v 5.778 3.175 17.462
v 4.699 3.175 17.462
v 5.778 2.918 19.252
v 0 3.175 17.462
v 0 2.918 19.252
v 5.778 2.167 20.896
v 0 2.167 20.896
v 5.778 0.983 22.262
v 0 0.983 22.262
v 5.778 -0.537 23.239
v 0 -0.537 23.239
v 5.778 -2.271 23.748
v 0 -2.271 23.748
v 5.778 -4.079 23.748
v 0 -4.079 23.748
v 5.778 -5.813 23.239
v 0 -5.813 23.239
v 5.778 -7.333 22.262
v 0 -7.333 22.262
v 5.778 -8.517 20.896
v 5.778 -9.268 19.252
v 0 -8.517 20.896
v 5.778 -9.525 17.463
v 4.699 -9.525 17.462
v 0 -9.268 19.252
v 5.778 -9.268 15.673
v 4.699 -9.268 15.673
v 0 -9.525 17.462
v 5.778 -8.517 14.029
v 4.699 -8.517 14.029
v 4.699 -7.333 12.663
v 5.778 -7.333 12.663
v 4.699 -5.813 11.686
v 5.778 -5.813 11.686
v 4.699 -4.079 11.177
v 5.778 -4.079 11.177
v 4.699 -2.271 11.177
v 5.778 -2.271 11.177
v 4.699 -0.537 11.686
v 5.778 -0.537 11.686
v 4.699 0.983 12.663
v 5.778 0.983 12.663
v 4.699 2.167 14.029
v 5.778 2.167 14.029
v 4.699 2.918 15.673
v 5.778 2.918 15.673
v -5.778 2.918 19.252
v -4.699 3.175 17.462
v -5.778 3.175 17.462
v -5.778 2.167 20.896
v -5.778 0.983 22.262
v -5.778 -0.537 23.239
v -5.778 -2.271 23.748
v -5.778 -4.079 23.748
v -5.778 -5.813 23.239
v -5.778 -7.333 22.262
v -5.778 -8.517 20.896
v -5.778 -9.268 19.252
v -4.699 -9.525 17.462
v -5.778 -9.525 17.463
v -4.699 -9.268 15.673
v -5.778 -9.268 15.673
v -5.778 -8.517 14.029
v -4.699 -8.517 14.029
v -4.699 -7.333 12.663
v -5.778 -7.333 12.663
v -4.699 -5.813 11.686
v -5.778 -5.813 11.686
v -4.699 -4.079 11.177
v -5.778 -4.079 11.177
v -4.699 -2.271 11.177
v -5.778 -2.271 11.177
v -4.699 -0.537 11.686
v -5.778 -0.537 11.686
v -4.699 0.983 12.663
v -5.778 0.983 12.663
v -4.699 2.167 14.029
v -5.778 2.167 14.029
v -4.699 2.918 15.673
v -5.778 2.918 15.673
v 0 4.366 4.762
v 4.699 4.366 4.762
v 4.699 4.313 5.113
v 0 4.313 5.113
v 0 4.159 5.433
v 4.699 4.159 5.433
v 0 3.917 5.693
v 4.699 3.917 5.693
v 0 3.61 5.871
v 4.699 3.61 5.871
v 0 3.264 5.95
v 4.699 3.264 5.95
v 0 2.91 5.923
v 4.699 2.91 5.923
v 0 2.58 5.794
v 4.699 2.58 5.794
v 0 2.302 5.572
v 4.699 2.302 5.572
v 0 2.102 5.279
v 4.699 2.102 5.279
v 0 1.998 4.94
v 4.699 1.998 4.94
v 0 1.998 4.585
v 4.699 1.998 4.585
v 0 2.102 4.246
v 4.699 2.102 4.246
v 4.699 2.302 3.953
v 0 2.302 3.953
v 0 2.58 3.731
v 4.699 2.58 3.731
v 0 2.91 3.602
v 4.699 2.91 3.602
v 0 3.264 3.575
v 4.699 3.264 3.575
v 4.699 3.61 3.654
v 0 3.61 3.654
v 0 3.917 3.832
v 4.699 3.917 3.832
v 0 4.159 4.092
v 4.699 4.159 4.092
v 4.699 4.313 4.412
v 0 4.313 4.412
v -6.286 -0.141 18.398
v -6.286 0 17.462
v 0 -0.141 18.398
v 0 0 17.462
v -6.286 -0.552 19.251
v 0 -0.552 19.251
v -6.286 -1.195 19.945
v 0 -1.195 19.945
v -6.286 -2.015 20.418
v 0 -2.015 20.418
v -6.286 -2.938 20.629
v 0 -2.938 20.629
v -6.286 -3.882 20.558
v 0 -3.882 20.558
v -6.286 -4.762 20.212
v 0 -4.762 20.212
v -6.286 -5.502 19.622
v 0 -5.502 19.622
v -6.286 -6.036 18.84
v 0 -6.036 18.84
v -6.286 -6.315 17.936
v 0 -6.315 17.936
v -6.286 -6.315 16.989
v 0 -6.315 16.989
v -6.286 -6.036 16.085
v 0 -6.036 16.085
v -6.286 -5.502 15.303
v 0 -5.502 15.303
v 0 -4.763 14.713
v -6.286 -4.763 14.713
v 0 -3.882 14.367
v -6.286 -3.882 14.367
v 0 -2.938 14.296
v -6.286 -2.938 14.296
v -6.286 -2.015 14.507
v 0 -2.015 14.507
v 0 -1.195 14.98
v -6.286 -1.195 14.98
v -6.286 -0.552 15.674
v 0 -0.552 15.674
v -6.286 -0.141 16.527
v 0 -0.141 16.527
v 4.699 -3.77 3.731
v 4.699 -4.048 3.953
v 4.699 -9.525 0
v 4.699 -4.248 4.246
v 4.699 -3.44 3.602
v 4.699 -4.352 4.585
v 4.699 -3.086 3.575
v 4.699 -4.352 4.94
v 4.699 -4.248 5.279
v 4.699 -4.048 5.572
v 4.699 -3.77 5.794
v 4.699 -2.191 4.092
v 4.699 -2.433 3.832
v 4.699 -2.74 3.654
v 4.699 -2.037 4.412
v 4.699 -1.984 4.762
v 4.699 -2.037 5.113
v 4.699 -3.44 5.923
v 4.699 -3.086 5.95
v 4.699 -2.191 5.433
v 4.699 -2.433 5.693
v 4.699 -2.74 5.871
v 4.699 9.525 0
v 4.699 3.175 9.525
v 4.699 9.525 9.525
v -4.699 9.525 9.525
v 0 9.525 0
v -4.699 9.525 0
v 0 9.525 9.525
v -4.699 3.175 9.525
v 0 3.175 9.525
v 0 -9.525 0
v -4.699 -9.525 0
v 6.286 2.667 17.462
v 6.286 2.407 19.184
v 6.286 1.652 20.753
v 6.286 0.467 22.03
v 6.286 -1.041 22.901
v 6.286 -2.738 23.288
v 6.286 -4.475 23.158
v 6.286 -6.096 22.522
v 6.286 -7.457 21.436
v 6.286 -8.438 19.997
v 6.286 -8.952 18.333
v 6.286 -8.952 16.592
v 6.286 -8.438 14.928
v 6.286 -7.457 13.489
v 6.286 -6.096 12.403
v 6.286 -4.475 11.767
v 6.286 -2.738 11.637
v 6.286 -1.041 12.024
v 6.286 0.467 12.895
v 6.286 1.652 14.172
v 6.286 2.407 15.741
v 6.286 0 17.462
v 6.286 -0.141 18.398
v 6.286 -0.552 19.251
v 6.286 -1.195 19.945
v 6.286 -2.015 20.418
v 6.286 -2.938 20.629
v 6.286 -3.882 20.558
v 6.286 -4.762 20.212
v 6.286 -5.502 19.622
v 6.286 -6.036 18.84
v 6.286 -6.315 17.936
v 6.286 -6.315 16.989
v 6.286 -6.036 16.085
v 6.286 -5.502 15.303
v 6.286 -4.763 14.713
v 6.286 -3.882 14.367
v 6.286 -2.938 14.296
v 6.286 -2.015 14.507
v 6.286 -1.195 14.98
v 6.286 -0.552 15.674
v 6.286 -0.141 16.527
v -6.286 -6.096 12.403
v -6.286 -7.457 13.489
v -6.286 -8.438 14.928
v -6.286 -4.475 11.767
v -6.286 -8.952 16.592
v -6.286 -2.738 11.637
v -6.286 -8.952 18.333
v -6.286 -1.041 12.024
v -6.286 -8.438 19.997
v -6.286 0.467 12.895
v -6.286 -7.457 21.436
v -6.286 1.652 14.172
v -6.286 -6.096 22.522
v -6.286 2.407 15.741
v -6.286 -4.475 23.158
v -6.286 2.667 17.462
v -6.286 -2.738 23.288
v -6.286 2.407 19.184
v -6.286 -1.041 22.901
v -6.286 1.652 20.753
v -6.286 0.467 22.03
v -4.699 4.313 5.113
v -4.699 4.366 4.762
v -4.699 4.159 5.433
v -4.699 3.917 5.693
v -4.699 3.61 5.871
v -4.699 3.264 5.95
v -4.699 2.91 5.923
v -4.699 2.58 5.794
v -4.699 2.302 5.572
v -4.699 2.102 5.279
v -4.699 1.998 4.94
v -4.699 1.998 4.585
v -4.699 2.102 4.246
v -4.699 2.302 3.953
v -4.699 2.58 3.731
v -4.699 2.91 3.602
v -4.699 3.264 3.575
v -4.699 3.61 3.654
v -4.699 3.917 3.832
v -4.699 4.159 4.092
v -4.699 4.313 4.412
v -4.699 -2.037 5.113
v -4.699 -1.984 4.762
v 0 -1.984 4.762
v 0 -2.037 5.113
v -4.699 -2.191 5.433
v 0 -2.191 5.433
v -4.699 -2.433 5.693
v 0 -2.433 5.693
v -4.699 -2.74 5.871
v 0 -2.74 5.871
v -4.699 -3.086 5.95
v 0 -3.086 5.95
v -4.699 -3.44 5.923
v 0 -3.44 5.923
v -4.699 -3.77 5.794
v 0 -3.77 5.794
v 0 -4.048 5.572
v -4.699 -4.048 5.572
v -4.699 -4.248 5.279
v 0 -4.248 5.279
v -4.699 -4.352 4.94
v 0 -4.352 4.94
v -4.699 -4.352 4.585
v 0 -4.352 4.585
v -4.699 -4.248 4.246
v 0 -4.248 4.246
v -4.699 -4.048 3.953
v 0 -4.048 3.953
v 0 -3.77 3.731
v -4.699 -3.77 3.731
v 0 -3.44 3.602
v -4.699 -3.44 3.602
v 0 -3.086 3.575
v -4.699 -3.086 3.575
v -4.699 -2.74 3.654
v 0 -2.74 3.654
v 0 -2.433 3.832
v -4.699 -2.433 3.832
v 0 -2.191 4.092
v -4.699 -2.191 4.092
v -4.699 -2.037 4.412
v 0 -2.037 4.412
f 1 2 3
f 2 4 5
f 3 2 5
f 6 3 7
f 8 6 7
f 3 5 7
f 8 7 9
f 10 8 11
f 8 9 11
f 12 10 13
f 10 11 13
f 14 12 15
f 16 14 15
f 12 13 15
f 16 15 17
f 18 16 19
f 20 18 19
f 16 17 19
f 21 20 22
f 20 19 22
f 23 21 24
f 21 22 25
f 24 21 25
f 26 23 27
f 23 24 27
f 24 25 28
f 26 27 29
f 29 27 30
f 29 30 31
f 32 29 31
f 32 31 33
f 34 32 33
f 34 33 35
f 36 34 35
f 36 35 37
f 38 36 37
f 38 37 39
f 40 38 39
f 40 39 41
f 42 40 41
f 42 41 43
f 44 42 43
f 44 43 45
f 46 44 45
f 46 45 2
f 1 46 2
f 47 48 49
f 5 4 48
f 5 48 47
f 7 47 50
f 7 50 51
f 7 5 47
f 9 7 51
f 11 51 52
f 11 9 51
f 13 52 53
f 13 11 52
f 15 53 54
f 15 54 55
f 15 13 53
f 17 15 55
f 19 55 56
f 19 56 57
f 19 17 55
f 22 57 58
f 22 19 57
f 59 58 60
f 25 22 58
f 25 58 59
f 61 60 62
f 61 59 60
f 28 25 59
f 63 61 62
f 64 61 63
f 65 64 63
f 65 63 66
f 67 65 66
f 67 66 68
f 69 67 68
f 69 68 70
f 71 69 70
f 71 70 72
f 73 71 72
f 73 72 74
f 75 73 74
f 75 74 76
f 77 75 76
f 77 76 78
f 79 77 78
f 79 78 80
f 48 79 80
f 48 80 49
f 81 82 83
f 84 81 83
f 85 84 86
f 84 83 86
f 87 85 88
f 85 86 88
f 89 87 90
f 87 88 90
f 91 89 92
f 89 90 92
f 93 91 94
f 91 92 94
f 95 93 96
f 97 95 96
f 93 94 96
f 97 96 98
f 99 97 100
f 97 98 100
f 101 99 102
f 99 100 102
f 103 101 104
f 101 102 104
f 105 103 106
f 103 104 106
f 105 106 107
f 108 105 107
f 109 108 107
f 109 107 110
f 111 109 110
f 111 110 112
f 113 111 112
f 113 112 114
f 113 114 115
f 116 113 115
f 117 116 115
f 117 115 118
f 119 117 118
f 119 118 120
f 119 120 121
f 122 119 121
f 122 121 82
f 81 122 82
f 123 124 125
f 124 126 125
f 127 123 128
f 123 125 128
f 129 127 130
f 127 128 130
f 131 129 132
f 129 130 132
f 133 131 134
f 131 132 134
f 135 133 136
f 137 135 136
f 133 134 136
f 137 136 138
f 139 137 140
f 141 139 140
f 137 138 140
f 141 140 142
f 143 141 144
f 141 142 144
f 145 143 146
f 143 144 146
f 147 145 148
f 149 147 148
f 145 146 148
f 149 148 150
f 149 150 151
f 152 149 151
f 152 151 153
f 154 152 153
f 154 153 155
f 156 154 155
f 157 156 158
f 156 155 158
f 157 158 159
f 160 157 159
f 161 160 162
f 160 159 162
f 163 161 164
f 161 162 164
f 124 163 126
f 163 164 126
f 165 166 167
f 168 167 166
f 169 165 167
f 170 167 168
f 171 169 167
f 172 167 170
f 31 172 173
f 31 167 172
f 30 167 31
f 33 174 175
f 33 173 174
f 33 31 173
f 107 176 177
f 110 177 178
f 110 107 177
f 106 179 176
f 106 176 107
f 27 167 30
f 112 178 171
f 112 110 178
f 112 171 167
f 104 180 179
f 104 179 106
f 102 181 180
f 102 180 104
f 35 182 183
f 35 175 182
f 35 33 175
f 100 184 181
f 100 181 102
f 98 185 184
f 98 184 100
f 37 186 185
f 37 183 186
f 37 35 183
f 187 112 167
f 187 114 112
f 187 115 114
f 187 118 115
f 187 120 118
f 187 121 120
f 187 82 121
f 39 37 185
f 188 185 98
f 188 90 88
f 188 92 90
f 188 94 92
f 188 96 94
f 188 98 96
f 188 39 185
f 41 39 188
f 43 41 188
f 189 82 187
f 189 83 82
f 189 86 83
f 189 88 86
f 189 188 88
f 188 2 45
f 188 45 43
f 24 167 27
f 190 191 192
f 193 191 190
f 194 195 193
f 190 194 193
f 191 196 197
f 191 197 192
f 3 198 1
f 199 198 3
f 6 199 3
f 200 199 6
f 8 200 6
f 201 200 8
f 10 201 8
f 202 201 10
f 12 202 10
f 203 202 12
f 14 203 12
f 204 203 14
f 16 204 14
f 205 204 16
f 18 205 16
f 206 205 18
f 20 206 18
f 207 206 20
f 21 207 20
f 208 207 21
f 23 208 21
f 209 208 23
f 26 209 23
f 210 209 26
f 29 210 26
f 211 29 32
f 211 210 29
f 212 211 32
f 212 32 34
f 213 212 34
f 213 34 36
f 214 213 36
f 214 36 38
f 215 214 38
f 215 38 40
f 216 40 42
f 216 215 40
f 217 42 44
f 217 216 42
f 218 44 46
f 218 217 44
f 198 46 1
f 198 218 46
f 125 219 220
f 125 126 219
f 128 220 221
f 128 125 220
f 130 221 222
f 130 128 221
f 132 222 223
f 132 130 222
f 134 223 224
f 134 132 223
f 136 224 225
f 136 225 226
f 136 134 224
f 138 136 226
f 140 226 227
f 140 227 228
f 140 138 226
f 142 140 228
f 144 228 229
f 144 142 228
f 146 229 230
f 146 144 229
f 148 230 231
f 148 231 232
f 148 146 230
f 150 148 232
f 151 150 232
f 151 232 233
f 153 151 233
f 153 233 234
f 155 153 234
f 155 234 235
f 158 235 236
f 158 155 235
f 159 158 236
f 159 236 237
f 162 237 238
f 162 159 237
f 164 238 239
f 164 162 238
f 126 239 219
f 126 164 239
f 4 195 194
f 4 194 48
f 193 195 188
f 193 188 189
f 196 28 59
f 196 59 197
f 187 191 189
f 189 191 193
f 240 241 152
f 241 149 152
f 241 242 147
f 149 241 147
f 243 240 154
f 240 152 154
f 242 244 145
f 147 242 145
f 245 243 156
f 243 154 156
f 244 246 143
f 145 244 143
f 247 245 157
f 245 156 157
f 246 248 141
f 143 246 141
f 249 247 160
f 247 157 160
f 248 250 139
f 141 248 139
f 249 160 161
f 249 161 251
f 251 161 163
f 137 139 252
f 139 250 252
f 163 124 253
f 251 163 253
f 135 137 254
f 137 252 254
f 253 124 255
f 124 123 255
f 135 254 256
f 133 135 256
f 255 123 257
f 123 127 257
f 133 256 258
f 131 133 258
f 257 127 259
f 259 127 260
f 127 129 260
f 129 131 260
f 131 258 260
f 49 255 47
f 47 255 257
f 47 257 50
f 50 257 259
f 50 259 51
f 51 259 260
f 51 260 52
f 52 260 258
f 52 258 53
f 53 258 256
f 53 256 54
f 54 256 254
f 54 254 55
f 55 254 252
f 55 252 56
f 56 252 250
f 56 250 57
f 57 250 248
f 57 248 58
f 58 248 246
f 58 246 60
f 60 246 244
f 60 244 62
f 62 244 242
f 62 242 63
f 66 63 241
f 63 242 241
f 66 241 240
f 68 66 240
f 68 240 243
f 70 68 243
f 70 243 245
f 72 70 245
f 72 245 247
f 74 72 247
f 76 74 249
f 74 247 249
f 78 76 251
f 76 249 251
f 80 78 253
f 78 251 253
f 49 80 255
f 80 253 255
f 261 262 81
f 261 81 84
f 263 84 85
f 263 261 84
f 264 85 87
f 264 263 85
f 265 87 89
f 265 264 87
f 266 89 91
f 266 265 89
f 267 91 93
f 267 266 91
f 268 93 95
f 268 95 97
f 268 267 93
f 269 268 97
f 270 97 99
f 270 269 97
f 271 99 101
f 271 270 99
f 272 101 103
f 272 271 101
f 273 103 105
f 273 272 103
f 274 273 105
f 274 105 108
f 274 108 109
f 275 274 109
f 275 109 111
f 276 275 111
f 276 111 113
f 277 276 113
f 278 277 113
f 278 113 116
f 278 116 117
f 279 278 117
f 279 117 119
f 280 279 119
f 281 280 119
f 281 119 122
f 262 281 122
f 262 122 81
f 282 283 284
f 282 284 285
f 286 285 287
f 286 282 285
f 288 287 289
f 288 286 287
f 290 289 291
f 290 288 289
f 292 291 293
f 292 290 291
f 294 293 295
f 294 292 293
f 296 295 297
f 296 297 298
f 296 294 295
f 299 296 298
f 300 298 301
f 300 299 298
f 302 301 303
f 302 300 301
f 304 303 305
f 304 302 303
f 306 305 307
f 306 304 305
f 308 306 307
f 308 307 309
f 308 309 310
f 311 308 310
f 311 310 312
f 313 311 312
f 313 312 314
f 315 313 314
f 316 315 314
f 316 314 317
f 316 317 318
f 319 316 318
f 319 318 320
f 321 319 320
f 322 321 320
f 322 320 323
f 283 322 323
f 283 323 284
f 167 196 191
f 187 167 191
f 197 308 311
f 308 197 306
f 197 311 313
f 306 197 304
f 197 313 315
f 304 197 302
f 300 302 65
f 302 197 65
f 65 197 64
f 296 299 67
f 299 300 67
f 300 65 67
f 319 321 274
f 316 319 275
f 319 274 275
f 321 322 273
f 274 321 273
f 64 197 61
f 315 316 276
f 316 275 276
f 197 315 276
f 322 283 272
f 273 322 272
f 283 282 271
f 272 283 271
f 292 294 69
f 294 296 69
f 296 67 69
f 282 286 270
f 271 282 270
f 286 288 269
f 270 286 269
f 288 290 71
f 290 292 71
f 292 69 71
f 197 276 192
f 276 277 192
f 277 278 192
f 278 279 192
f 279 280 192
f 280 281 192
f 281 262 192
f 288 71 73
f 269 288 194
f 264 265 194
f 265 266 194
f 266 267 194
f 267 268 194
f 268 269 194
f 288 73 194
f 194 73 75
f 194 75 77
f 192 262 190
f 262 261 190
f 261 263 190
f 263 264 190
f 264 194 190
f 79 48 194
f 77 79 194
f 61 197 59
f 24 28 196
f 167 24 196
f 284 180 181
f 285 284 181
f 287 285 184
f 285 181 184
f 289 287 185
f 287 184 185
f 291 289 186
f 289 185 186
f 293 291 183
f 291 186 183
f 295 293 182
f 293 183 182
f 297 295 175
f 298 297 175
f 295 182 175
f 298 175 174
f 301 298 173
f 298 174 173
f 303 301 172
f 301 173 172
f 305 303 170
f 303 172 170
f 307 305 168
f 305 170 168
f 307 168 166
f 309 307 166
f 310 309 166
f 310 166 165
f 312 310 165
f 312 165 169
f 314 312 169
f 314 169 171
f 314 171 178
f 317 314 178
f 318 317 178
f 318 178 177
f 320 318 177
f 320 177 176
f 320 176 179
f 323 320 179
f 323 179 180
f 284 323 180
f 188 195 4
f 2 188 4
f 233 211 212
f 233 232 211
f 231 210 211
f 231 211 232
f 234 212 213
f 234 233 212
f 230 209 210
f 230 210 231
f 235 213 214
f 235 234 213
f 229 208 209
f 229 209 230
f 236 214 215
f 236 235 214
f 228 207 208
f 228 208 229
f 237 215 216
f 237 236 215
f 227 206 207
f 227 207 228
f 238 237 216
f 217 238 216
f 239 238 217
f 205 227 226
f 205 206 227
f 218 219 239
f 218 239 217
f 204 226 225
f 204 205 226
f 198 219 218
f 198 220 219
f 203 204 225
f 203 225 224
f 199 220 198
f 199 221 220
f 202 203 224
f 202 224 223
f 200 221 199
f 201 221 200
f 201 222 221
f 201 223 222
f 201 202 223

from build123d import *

# Parameters (mm, degrees)
F0_W     = 19.05
F0_H     = 9.525
F1_DEPTH = 4.699
F2_R     = 3.175
F3_DEPTH = 4.699
F4_R     = 1.190625
F5_DEPTH = 4.7
F6_R     = 6.35
F6_R_2   = 3.175
F7_DEPTH = 1.5875
F9_SIZE  = 0.508


with BuildPart() as f1:
    # F0 (on Right) → F1 (new body)
    with BuildSketch(Plane.YZ):
        with Locations((0, 4.7625)):
            Rectangle(F0_W, F0_H)
    extrude(amount=F1_DEPTH)

    # F2 (on Right) → F3 (join)
    with BuildSketch(Plane.YZ):
        with BuildLine():
            ThreePointArc((-9.525, 17.4625), (-3.175, 11.1125), (3.175, 17.4625))
            ThreePointArc((3.175, 17.4625), (-3.175, 23.8125), (-9.525, 17.4625))
        make_face()
        with Locations((-3.175, 17.4625)):
            Circle(F2_R, mode=Mode.SUBTRACT)
        with BuildLine():
            Line((3.175, 0), (3.175, 17.4625))
            ThreePointArc((3.175, 17.4625), (-3.175, 11.1125), (-9.525, 17.4625))
            Line((-9.525, 17.4625), (-9.525, 0))
            Line((-9.525, 0), (3.175, 0))
        make_face()
    extrude(amount=F3_DEPTH)

    # F4 (on face) → F5 (cut, through all)
    with BuildSketch(Plane.YZ.offset(4.699)):
        with Locations((-3.175, 4.7625)):
            Circle(F4_R)
        with Locations((3.175, 4.7625)):
            Circle(F4_R)
    extrude(amount=-F5_DEPTH, mode=Mode.SUBTRACT)

    # F6 (on face) → F7 (join)
    with BuildSketch(Plane.YZ.offset(4.699)):
        with Locations((-3.175, 17.4625)):
            Circle(F6_R)
        with Locations((-3.175, 17.4625)):
            Circle(F6_R_2, mode=Mode.SUBTRACT)
    extrude(amount=F7_DEPTH)

    # F8: F1 across plane


with BuildPart() as f1_1:
    add(f1.part)
    add(f1.part.mirror(Plane.YZ))

    # F9
    f9_edges = [f1_1.edges().sort_by_distance(p)[0] for p in [
        (6.2865, -9.525, 17.4625),
        (-6.2865, -9.525, 17.4625),
    ]]
    chamfer(f9_edges, length=F9_SIZE)


solid = f1_1.part
